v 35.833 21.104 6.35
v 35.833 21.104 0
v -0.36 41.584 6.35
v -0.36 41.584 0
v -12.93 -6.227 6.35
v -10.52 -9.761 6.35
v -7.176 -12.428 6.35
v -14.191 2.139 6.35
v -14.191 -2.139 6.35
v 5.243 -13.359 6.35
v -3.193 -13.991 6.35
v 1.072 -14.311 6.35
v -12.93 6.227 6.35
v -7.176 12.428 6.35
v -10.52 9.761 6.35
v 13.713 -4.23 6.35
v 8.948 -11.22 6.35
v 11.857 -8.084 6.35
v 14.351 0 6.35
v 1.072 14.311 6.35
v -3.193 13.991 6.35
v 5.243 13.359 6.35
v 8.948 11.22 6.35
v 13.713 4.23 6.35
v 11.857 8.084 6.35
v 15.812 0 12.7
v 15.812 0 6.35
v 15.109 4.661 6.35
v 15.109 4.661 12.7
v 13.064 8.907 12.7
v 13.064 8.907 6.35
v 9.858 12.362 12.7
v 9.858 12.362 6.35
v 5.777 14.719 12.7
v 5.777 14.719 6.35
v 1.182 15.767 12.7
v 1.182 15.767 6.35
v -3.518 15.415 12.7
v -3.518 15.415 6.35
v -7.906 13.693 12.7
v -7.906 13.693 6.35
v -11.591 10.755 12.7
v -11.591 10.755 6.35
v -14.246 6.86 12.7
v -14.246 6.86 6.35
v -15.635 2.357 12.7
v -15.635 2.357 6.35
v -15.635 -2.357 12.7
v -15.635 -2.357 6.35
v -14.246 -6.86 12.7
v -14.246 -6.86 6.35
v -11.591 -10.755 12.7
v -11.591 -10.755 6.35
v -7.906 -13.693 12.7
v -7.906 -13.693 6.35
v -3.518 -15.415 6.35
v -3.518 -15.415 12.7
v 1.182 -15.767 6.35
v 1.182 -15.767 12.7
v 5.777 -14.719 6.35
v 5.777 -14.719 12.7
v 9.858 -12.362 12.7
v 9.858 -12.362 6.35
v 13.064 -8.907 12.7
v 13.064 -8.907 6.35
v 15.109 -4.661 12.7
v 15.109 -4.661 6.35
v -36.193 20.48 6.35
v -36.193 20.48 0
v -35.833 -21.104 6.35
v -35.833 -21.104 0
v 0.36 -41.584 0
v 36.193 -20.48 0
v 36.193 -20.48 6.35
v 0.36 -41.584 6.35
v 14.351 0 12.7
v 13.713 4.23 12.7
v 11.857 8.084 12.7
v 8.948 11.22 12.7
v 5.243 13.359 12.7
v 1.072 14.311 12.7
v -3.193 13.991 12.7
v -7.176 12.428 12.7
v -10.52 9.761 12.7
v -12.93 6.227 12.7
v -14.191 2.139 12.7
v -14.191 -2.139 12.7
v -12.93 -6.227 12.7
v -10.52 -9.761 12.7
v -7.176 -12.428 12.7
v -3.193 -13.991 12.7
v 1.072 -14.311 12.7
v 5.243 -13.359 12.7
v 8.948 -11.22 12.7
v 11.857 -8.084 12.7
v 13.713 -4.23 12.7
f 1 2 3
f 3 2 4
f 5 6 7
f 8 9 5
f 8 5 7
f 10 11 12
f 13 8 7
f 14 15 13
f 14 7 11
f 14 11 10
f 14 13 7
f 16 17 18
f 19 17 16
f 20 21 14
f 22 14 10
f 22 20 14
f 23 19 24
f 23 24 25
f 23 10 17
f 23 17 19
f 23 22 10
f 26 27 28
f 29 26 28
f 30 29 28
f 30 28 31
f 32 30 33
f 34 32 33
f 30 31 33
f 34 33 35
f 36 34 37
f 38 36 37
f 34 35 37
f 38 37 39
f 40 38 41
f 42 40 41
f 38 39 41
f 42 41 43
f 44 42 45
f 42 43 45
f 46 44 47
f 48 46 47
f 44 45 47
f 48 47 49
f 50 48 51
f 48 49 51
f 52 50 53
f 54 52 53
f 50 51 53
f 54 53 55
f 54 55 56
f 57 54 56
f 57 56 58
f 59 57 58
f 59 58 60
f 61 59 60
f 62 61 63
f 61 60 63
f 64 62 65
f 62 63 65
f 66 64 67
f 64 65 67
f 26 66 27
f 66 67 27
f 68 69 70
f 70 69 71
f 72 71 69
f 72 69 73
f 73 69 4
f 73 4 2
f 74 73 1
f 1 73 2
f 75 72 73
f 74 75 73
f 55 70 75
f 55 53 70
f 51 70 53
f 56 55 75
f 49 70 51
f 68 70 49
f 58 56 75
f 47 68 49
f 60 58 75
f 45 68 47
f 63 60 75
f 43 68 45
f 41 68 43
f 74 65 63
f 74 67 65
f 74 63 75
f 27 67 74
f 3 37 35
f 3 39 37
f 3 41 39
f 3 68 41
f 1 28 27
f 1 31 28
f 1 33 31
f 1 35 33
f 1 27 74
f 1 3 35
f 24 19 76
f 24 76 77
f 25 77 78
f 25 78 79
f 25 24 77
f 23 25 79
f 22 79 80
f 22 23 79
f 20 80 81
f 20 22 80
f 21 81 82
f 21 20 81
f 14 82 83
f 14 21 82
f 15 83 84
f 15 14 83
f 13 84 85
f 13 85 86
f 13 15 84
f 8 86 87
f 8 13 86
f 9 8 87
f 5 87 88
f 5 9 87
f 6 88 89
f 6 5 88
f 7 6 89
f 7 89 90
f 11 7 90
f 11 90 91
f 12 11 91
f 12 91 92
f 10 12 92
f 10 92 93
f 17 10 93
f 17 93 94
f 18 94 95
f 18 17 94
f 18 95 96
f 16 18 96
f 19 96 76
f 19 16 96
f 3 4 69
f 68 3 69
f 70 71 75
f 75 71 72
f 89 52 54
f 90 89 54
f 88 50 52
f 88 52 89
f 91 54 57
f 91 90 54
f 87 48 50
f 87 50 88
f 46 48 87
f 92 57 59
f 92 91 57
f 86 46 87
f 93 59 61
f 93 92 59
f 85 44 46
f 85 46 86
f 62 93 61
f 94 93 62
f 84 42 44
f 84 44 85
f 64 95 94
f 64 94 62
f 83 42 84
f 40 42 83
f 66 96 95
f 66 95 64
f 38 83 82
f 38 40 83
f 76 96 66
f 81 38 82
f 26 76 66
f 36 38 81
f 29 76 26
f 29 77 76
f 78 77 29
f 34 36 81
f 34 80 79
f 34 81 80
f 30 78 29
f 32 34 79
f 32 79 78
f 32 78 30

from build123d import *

# Parameters (mm, degrees)
F1_DEPTH = 6.35
F2_R     = 15.8115
F2_R_2   = 14.351
F3_DEPTH = 6.35


with BuildPart() as f1:
    # F0 (on Top) → F1 (new body)
    with BuildSketch(Plane.XY):
        Polygon((0.360184, -41.58426), (36.193117, -20.480202), (35.832934, 21.104058), (-0.360184, 41.58426), (-36.193117, 20.480202), (-35.832934, -21.104058), align=None)
    extrude(amount=F1_DEPTH)

    # F2 (on face) → F3 (join)
    with BuildSketch(Plane.XY.offset(6.35)):
        Circle(F2_R)
        Circle(F2_R_2, mode=Mode.SUBTRACT)
    extrude(amount=F3_DEPTH)


solid = f1.part
